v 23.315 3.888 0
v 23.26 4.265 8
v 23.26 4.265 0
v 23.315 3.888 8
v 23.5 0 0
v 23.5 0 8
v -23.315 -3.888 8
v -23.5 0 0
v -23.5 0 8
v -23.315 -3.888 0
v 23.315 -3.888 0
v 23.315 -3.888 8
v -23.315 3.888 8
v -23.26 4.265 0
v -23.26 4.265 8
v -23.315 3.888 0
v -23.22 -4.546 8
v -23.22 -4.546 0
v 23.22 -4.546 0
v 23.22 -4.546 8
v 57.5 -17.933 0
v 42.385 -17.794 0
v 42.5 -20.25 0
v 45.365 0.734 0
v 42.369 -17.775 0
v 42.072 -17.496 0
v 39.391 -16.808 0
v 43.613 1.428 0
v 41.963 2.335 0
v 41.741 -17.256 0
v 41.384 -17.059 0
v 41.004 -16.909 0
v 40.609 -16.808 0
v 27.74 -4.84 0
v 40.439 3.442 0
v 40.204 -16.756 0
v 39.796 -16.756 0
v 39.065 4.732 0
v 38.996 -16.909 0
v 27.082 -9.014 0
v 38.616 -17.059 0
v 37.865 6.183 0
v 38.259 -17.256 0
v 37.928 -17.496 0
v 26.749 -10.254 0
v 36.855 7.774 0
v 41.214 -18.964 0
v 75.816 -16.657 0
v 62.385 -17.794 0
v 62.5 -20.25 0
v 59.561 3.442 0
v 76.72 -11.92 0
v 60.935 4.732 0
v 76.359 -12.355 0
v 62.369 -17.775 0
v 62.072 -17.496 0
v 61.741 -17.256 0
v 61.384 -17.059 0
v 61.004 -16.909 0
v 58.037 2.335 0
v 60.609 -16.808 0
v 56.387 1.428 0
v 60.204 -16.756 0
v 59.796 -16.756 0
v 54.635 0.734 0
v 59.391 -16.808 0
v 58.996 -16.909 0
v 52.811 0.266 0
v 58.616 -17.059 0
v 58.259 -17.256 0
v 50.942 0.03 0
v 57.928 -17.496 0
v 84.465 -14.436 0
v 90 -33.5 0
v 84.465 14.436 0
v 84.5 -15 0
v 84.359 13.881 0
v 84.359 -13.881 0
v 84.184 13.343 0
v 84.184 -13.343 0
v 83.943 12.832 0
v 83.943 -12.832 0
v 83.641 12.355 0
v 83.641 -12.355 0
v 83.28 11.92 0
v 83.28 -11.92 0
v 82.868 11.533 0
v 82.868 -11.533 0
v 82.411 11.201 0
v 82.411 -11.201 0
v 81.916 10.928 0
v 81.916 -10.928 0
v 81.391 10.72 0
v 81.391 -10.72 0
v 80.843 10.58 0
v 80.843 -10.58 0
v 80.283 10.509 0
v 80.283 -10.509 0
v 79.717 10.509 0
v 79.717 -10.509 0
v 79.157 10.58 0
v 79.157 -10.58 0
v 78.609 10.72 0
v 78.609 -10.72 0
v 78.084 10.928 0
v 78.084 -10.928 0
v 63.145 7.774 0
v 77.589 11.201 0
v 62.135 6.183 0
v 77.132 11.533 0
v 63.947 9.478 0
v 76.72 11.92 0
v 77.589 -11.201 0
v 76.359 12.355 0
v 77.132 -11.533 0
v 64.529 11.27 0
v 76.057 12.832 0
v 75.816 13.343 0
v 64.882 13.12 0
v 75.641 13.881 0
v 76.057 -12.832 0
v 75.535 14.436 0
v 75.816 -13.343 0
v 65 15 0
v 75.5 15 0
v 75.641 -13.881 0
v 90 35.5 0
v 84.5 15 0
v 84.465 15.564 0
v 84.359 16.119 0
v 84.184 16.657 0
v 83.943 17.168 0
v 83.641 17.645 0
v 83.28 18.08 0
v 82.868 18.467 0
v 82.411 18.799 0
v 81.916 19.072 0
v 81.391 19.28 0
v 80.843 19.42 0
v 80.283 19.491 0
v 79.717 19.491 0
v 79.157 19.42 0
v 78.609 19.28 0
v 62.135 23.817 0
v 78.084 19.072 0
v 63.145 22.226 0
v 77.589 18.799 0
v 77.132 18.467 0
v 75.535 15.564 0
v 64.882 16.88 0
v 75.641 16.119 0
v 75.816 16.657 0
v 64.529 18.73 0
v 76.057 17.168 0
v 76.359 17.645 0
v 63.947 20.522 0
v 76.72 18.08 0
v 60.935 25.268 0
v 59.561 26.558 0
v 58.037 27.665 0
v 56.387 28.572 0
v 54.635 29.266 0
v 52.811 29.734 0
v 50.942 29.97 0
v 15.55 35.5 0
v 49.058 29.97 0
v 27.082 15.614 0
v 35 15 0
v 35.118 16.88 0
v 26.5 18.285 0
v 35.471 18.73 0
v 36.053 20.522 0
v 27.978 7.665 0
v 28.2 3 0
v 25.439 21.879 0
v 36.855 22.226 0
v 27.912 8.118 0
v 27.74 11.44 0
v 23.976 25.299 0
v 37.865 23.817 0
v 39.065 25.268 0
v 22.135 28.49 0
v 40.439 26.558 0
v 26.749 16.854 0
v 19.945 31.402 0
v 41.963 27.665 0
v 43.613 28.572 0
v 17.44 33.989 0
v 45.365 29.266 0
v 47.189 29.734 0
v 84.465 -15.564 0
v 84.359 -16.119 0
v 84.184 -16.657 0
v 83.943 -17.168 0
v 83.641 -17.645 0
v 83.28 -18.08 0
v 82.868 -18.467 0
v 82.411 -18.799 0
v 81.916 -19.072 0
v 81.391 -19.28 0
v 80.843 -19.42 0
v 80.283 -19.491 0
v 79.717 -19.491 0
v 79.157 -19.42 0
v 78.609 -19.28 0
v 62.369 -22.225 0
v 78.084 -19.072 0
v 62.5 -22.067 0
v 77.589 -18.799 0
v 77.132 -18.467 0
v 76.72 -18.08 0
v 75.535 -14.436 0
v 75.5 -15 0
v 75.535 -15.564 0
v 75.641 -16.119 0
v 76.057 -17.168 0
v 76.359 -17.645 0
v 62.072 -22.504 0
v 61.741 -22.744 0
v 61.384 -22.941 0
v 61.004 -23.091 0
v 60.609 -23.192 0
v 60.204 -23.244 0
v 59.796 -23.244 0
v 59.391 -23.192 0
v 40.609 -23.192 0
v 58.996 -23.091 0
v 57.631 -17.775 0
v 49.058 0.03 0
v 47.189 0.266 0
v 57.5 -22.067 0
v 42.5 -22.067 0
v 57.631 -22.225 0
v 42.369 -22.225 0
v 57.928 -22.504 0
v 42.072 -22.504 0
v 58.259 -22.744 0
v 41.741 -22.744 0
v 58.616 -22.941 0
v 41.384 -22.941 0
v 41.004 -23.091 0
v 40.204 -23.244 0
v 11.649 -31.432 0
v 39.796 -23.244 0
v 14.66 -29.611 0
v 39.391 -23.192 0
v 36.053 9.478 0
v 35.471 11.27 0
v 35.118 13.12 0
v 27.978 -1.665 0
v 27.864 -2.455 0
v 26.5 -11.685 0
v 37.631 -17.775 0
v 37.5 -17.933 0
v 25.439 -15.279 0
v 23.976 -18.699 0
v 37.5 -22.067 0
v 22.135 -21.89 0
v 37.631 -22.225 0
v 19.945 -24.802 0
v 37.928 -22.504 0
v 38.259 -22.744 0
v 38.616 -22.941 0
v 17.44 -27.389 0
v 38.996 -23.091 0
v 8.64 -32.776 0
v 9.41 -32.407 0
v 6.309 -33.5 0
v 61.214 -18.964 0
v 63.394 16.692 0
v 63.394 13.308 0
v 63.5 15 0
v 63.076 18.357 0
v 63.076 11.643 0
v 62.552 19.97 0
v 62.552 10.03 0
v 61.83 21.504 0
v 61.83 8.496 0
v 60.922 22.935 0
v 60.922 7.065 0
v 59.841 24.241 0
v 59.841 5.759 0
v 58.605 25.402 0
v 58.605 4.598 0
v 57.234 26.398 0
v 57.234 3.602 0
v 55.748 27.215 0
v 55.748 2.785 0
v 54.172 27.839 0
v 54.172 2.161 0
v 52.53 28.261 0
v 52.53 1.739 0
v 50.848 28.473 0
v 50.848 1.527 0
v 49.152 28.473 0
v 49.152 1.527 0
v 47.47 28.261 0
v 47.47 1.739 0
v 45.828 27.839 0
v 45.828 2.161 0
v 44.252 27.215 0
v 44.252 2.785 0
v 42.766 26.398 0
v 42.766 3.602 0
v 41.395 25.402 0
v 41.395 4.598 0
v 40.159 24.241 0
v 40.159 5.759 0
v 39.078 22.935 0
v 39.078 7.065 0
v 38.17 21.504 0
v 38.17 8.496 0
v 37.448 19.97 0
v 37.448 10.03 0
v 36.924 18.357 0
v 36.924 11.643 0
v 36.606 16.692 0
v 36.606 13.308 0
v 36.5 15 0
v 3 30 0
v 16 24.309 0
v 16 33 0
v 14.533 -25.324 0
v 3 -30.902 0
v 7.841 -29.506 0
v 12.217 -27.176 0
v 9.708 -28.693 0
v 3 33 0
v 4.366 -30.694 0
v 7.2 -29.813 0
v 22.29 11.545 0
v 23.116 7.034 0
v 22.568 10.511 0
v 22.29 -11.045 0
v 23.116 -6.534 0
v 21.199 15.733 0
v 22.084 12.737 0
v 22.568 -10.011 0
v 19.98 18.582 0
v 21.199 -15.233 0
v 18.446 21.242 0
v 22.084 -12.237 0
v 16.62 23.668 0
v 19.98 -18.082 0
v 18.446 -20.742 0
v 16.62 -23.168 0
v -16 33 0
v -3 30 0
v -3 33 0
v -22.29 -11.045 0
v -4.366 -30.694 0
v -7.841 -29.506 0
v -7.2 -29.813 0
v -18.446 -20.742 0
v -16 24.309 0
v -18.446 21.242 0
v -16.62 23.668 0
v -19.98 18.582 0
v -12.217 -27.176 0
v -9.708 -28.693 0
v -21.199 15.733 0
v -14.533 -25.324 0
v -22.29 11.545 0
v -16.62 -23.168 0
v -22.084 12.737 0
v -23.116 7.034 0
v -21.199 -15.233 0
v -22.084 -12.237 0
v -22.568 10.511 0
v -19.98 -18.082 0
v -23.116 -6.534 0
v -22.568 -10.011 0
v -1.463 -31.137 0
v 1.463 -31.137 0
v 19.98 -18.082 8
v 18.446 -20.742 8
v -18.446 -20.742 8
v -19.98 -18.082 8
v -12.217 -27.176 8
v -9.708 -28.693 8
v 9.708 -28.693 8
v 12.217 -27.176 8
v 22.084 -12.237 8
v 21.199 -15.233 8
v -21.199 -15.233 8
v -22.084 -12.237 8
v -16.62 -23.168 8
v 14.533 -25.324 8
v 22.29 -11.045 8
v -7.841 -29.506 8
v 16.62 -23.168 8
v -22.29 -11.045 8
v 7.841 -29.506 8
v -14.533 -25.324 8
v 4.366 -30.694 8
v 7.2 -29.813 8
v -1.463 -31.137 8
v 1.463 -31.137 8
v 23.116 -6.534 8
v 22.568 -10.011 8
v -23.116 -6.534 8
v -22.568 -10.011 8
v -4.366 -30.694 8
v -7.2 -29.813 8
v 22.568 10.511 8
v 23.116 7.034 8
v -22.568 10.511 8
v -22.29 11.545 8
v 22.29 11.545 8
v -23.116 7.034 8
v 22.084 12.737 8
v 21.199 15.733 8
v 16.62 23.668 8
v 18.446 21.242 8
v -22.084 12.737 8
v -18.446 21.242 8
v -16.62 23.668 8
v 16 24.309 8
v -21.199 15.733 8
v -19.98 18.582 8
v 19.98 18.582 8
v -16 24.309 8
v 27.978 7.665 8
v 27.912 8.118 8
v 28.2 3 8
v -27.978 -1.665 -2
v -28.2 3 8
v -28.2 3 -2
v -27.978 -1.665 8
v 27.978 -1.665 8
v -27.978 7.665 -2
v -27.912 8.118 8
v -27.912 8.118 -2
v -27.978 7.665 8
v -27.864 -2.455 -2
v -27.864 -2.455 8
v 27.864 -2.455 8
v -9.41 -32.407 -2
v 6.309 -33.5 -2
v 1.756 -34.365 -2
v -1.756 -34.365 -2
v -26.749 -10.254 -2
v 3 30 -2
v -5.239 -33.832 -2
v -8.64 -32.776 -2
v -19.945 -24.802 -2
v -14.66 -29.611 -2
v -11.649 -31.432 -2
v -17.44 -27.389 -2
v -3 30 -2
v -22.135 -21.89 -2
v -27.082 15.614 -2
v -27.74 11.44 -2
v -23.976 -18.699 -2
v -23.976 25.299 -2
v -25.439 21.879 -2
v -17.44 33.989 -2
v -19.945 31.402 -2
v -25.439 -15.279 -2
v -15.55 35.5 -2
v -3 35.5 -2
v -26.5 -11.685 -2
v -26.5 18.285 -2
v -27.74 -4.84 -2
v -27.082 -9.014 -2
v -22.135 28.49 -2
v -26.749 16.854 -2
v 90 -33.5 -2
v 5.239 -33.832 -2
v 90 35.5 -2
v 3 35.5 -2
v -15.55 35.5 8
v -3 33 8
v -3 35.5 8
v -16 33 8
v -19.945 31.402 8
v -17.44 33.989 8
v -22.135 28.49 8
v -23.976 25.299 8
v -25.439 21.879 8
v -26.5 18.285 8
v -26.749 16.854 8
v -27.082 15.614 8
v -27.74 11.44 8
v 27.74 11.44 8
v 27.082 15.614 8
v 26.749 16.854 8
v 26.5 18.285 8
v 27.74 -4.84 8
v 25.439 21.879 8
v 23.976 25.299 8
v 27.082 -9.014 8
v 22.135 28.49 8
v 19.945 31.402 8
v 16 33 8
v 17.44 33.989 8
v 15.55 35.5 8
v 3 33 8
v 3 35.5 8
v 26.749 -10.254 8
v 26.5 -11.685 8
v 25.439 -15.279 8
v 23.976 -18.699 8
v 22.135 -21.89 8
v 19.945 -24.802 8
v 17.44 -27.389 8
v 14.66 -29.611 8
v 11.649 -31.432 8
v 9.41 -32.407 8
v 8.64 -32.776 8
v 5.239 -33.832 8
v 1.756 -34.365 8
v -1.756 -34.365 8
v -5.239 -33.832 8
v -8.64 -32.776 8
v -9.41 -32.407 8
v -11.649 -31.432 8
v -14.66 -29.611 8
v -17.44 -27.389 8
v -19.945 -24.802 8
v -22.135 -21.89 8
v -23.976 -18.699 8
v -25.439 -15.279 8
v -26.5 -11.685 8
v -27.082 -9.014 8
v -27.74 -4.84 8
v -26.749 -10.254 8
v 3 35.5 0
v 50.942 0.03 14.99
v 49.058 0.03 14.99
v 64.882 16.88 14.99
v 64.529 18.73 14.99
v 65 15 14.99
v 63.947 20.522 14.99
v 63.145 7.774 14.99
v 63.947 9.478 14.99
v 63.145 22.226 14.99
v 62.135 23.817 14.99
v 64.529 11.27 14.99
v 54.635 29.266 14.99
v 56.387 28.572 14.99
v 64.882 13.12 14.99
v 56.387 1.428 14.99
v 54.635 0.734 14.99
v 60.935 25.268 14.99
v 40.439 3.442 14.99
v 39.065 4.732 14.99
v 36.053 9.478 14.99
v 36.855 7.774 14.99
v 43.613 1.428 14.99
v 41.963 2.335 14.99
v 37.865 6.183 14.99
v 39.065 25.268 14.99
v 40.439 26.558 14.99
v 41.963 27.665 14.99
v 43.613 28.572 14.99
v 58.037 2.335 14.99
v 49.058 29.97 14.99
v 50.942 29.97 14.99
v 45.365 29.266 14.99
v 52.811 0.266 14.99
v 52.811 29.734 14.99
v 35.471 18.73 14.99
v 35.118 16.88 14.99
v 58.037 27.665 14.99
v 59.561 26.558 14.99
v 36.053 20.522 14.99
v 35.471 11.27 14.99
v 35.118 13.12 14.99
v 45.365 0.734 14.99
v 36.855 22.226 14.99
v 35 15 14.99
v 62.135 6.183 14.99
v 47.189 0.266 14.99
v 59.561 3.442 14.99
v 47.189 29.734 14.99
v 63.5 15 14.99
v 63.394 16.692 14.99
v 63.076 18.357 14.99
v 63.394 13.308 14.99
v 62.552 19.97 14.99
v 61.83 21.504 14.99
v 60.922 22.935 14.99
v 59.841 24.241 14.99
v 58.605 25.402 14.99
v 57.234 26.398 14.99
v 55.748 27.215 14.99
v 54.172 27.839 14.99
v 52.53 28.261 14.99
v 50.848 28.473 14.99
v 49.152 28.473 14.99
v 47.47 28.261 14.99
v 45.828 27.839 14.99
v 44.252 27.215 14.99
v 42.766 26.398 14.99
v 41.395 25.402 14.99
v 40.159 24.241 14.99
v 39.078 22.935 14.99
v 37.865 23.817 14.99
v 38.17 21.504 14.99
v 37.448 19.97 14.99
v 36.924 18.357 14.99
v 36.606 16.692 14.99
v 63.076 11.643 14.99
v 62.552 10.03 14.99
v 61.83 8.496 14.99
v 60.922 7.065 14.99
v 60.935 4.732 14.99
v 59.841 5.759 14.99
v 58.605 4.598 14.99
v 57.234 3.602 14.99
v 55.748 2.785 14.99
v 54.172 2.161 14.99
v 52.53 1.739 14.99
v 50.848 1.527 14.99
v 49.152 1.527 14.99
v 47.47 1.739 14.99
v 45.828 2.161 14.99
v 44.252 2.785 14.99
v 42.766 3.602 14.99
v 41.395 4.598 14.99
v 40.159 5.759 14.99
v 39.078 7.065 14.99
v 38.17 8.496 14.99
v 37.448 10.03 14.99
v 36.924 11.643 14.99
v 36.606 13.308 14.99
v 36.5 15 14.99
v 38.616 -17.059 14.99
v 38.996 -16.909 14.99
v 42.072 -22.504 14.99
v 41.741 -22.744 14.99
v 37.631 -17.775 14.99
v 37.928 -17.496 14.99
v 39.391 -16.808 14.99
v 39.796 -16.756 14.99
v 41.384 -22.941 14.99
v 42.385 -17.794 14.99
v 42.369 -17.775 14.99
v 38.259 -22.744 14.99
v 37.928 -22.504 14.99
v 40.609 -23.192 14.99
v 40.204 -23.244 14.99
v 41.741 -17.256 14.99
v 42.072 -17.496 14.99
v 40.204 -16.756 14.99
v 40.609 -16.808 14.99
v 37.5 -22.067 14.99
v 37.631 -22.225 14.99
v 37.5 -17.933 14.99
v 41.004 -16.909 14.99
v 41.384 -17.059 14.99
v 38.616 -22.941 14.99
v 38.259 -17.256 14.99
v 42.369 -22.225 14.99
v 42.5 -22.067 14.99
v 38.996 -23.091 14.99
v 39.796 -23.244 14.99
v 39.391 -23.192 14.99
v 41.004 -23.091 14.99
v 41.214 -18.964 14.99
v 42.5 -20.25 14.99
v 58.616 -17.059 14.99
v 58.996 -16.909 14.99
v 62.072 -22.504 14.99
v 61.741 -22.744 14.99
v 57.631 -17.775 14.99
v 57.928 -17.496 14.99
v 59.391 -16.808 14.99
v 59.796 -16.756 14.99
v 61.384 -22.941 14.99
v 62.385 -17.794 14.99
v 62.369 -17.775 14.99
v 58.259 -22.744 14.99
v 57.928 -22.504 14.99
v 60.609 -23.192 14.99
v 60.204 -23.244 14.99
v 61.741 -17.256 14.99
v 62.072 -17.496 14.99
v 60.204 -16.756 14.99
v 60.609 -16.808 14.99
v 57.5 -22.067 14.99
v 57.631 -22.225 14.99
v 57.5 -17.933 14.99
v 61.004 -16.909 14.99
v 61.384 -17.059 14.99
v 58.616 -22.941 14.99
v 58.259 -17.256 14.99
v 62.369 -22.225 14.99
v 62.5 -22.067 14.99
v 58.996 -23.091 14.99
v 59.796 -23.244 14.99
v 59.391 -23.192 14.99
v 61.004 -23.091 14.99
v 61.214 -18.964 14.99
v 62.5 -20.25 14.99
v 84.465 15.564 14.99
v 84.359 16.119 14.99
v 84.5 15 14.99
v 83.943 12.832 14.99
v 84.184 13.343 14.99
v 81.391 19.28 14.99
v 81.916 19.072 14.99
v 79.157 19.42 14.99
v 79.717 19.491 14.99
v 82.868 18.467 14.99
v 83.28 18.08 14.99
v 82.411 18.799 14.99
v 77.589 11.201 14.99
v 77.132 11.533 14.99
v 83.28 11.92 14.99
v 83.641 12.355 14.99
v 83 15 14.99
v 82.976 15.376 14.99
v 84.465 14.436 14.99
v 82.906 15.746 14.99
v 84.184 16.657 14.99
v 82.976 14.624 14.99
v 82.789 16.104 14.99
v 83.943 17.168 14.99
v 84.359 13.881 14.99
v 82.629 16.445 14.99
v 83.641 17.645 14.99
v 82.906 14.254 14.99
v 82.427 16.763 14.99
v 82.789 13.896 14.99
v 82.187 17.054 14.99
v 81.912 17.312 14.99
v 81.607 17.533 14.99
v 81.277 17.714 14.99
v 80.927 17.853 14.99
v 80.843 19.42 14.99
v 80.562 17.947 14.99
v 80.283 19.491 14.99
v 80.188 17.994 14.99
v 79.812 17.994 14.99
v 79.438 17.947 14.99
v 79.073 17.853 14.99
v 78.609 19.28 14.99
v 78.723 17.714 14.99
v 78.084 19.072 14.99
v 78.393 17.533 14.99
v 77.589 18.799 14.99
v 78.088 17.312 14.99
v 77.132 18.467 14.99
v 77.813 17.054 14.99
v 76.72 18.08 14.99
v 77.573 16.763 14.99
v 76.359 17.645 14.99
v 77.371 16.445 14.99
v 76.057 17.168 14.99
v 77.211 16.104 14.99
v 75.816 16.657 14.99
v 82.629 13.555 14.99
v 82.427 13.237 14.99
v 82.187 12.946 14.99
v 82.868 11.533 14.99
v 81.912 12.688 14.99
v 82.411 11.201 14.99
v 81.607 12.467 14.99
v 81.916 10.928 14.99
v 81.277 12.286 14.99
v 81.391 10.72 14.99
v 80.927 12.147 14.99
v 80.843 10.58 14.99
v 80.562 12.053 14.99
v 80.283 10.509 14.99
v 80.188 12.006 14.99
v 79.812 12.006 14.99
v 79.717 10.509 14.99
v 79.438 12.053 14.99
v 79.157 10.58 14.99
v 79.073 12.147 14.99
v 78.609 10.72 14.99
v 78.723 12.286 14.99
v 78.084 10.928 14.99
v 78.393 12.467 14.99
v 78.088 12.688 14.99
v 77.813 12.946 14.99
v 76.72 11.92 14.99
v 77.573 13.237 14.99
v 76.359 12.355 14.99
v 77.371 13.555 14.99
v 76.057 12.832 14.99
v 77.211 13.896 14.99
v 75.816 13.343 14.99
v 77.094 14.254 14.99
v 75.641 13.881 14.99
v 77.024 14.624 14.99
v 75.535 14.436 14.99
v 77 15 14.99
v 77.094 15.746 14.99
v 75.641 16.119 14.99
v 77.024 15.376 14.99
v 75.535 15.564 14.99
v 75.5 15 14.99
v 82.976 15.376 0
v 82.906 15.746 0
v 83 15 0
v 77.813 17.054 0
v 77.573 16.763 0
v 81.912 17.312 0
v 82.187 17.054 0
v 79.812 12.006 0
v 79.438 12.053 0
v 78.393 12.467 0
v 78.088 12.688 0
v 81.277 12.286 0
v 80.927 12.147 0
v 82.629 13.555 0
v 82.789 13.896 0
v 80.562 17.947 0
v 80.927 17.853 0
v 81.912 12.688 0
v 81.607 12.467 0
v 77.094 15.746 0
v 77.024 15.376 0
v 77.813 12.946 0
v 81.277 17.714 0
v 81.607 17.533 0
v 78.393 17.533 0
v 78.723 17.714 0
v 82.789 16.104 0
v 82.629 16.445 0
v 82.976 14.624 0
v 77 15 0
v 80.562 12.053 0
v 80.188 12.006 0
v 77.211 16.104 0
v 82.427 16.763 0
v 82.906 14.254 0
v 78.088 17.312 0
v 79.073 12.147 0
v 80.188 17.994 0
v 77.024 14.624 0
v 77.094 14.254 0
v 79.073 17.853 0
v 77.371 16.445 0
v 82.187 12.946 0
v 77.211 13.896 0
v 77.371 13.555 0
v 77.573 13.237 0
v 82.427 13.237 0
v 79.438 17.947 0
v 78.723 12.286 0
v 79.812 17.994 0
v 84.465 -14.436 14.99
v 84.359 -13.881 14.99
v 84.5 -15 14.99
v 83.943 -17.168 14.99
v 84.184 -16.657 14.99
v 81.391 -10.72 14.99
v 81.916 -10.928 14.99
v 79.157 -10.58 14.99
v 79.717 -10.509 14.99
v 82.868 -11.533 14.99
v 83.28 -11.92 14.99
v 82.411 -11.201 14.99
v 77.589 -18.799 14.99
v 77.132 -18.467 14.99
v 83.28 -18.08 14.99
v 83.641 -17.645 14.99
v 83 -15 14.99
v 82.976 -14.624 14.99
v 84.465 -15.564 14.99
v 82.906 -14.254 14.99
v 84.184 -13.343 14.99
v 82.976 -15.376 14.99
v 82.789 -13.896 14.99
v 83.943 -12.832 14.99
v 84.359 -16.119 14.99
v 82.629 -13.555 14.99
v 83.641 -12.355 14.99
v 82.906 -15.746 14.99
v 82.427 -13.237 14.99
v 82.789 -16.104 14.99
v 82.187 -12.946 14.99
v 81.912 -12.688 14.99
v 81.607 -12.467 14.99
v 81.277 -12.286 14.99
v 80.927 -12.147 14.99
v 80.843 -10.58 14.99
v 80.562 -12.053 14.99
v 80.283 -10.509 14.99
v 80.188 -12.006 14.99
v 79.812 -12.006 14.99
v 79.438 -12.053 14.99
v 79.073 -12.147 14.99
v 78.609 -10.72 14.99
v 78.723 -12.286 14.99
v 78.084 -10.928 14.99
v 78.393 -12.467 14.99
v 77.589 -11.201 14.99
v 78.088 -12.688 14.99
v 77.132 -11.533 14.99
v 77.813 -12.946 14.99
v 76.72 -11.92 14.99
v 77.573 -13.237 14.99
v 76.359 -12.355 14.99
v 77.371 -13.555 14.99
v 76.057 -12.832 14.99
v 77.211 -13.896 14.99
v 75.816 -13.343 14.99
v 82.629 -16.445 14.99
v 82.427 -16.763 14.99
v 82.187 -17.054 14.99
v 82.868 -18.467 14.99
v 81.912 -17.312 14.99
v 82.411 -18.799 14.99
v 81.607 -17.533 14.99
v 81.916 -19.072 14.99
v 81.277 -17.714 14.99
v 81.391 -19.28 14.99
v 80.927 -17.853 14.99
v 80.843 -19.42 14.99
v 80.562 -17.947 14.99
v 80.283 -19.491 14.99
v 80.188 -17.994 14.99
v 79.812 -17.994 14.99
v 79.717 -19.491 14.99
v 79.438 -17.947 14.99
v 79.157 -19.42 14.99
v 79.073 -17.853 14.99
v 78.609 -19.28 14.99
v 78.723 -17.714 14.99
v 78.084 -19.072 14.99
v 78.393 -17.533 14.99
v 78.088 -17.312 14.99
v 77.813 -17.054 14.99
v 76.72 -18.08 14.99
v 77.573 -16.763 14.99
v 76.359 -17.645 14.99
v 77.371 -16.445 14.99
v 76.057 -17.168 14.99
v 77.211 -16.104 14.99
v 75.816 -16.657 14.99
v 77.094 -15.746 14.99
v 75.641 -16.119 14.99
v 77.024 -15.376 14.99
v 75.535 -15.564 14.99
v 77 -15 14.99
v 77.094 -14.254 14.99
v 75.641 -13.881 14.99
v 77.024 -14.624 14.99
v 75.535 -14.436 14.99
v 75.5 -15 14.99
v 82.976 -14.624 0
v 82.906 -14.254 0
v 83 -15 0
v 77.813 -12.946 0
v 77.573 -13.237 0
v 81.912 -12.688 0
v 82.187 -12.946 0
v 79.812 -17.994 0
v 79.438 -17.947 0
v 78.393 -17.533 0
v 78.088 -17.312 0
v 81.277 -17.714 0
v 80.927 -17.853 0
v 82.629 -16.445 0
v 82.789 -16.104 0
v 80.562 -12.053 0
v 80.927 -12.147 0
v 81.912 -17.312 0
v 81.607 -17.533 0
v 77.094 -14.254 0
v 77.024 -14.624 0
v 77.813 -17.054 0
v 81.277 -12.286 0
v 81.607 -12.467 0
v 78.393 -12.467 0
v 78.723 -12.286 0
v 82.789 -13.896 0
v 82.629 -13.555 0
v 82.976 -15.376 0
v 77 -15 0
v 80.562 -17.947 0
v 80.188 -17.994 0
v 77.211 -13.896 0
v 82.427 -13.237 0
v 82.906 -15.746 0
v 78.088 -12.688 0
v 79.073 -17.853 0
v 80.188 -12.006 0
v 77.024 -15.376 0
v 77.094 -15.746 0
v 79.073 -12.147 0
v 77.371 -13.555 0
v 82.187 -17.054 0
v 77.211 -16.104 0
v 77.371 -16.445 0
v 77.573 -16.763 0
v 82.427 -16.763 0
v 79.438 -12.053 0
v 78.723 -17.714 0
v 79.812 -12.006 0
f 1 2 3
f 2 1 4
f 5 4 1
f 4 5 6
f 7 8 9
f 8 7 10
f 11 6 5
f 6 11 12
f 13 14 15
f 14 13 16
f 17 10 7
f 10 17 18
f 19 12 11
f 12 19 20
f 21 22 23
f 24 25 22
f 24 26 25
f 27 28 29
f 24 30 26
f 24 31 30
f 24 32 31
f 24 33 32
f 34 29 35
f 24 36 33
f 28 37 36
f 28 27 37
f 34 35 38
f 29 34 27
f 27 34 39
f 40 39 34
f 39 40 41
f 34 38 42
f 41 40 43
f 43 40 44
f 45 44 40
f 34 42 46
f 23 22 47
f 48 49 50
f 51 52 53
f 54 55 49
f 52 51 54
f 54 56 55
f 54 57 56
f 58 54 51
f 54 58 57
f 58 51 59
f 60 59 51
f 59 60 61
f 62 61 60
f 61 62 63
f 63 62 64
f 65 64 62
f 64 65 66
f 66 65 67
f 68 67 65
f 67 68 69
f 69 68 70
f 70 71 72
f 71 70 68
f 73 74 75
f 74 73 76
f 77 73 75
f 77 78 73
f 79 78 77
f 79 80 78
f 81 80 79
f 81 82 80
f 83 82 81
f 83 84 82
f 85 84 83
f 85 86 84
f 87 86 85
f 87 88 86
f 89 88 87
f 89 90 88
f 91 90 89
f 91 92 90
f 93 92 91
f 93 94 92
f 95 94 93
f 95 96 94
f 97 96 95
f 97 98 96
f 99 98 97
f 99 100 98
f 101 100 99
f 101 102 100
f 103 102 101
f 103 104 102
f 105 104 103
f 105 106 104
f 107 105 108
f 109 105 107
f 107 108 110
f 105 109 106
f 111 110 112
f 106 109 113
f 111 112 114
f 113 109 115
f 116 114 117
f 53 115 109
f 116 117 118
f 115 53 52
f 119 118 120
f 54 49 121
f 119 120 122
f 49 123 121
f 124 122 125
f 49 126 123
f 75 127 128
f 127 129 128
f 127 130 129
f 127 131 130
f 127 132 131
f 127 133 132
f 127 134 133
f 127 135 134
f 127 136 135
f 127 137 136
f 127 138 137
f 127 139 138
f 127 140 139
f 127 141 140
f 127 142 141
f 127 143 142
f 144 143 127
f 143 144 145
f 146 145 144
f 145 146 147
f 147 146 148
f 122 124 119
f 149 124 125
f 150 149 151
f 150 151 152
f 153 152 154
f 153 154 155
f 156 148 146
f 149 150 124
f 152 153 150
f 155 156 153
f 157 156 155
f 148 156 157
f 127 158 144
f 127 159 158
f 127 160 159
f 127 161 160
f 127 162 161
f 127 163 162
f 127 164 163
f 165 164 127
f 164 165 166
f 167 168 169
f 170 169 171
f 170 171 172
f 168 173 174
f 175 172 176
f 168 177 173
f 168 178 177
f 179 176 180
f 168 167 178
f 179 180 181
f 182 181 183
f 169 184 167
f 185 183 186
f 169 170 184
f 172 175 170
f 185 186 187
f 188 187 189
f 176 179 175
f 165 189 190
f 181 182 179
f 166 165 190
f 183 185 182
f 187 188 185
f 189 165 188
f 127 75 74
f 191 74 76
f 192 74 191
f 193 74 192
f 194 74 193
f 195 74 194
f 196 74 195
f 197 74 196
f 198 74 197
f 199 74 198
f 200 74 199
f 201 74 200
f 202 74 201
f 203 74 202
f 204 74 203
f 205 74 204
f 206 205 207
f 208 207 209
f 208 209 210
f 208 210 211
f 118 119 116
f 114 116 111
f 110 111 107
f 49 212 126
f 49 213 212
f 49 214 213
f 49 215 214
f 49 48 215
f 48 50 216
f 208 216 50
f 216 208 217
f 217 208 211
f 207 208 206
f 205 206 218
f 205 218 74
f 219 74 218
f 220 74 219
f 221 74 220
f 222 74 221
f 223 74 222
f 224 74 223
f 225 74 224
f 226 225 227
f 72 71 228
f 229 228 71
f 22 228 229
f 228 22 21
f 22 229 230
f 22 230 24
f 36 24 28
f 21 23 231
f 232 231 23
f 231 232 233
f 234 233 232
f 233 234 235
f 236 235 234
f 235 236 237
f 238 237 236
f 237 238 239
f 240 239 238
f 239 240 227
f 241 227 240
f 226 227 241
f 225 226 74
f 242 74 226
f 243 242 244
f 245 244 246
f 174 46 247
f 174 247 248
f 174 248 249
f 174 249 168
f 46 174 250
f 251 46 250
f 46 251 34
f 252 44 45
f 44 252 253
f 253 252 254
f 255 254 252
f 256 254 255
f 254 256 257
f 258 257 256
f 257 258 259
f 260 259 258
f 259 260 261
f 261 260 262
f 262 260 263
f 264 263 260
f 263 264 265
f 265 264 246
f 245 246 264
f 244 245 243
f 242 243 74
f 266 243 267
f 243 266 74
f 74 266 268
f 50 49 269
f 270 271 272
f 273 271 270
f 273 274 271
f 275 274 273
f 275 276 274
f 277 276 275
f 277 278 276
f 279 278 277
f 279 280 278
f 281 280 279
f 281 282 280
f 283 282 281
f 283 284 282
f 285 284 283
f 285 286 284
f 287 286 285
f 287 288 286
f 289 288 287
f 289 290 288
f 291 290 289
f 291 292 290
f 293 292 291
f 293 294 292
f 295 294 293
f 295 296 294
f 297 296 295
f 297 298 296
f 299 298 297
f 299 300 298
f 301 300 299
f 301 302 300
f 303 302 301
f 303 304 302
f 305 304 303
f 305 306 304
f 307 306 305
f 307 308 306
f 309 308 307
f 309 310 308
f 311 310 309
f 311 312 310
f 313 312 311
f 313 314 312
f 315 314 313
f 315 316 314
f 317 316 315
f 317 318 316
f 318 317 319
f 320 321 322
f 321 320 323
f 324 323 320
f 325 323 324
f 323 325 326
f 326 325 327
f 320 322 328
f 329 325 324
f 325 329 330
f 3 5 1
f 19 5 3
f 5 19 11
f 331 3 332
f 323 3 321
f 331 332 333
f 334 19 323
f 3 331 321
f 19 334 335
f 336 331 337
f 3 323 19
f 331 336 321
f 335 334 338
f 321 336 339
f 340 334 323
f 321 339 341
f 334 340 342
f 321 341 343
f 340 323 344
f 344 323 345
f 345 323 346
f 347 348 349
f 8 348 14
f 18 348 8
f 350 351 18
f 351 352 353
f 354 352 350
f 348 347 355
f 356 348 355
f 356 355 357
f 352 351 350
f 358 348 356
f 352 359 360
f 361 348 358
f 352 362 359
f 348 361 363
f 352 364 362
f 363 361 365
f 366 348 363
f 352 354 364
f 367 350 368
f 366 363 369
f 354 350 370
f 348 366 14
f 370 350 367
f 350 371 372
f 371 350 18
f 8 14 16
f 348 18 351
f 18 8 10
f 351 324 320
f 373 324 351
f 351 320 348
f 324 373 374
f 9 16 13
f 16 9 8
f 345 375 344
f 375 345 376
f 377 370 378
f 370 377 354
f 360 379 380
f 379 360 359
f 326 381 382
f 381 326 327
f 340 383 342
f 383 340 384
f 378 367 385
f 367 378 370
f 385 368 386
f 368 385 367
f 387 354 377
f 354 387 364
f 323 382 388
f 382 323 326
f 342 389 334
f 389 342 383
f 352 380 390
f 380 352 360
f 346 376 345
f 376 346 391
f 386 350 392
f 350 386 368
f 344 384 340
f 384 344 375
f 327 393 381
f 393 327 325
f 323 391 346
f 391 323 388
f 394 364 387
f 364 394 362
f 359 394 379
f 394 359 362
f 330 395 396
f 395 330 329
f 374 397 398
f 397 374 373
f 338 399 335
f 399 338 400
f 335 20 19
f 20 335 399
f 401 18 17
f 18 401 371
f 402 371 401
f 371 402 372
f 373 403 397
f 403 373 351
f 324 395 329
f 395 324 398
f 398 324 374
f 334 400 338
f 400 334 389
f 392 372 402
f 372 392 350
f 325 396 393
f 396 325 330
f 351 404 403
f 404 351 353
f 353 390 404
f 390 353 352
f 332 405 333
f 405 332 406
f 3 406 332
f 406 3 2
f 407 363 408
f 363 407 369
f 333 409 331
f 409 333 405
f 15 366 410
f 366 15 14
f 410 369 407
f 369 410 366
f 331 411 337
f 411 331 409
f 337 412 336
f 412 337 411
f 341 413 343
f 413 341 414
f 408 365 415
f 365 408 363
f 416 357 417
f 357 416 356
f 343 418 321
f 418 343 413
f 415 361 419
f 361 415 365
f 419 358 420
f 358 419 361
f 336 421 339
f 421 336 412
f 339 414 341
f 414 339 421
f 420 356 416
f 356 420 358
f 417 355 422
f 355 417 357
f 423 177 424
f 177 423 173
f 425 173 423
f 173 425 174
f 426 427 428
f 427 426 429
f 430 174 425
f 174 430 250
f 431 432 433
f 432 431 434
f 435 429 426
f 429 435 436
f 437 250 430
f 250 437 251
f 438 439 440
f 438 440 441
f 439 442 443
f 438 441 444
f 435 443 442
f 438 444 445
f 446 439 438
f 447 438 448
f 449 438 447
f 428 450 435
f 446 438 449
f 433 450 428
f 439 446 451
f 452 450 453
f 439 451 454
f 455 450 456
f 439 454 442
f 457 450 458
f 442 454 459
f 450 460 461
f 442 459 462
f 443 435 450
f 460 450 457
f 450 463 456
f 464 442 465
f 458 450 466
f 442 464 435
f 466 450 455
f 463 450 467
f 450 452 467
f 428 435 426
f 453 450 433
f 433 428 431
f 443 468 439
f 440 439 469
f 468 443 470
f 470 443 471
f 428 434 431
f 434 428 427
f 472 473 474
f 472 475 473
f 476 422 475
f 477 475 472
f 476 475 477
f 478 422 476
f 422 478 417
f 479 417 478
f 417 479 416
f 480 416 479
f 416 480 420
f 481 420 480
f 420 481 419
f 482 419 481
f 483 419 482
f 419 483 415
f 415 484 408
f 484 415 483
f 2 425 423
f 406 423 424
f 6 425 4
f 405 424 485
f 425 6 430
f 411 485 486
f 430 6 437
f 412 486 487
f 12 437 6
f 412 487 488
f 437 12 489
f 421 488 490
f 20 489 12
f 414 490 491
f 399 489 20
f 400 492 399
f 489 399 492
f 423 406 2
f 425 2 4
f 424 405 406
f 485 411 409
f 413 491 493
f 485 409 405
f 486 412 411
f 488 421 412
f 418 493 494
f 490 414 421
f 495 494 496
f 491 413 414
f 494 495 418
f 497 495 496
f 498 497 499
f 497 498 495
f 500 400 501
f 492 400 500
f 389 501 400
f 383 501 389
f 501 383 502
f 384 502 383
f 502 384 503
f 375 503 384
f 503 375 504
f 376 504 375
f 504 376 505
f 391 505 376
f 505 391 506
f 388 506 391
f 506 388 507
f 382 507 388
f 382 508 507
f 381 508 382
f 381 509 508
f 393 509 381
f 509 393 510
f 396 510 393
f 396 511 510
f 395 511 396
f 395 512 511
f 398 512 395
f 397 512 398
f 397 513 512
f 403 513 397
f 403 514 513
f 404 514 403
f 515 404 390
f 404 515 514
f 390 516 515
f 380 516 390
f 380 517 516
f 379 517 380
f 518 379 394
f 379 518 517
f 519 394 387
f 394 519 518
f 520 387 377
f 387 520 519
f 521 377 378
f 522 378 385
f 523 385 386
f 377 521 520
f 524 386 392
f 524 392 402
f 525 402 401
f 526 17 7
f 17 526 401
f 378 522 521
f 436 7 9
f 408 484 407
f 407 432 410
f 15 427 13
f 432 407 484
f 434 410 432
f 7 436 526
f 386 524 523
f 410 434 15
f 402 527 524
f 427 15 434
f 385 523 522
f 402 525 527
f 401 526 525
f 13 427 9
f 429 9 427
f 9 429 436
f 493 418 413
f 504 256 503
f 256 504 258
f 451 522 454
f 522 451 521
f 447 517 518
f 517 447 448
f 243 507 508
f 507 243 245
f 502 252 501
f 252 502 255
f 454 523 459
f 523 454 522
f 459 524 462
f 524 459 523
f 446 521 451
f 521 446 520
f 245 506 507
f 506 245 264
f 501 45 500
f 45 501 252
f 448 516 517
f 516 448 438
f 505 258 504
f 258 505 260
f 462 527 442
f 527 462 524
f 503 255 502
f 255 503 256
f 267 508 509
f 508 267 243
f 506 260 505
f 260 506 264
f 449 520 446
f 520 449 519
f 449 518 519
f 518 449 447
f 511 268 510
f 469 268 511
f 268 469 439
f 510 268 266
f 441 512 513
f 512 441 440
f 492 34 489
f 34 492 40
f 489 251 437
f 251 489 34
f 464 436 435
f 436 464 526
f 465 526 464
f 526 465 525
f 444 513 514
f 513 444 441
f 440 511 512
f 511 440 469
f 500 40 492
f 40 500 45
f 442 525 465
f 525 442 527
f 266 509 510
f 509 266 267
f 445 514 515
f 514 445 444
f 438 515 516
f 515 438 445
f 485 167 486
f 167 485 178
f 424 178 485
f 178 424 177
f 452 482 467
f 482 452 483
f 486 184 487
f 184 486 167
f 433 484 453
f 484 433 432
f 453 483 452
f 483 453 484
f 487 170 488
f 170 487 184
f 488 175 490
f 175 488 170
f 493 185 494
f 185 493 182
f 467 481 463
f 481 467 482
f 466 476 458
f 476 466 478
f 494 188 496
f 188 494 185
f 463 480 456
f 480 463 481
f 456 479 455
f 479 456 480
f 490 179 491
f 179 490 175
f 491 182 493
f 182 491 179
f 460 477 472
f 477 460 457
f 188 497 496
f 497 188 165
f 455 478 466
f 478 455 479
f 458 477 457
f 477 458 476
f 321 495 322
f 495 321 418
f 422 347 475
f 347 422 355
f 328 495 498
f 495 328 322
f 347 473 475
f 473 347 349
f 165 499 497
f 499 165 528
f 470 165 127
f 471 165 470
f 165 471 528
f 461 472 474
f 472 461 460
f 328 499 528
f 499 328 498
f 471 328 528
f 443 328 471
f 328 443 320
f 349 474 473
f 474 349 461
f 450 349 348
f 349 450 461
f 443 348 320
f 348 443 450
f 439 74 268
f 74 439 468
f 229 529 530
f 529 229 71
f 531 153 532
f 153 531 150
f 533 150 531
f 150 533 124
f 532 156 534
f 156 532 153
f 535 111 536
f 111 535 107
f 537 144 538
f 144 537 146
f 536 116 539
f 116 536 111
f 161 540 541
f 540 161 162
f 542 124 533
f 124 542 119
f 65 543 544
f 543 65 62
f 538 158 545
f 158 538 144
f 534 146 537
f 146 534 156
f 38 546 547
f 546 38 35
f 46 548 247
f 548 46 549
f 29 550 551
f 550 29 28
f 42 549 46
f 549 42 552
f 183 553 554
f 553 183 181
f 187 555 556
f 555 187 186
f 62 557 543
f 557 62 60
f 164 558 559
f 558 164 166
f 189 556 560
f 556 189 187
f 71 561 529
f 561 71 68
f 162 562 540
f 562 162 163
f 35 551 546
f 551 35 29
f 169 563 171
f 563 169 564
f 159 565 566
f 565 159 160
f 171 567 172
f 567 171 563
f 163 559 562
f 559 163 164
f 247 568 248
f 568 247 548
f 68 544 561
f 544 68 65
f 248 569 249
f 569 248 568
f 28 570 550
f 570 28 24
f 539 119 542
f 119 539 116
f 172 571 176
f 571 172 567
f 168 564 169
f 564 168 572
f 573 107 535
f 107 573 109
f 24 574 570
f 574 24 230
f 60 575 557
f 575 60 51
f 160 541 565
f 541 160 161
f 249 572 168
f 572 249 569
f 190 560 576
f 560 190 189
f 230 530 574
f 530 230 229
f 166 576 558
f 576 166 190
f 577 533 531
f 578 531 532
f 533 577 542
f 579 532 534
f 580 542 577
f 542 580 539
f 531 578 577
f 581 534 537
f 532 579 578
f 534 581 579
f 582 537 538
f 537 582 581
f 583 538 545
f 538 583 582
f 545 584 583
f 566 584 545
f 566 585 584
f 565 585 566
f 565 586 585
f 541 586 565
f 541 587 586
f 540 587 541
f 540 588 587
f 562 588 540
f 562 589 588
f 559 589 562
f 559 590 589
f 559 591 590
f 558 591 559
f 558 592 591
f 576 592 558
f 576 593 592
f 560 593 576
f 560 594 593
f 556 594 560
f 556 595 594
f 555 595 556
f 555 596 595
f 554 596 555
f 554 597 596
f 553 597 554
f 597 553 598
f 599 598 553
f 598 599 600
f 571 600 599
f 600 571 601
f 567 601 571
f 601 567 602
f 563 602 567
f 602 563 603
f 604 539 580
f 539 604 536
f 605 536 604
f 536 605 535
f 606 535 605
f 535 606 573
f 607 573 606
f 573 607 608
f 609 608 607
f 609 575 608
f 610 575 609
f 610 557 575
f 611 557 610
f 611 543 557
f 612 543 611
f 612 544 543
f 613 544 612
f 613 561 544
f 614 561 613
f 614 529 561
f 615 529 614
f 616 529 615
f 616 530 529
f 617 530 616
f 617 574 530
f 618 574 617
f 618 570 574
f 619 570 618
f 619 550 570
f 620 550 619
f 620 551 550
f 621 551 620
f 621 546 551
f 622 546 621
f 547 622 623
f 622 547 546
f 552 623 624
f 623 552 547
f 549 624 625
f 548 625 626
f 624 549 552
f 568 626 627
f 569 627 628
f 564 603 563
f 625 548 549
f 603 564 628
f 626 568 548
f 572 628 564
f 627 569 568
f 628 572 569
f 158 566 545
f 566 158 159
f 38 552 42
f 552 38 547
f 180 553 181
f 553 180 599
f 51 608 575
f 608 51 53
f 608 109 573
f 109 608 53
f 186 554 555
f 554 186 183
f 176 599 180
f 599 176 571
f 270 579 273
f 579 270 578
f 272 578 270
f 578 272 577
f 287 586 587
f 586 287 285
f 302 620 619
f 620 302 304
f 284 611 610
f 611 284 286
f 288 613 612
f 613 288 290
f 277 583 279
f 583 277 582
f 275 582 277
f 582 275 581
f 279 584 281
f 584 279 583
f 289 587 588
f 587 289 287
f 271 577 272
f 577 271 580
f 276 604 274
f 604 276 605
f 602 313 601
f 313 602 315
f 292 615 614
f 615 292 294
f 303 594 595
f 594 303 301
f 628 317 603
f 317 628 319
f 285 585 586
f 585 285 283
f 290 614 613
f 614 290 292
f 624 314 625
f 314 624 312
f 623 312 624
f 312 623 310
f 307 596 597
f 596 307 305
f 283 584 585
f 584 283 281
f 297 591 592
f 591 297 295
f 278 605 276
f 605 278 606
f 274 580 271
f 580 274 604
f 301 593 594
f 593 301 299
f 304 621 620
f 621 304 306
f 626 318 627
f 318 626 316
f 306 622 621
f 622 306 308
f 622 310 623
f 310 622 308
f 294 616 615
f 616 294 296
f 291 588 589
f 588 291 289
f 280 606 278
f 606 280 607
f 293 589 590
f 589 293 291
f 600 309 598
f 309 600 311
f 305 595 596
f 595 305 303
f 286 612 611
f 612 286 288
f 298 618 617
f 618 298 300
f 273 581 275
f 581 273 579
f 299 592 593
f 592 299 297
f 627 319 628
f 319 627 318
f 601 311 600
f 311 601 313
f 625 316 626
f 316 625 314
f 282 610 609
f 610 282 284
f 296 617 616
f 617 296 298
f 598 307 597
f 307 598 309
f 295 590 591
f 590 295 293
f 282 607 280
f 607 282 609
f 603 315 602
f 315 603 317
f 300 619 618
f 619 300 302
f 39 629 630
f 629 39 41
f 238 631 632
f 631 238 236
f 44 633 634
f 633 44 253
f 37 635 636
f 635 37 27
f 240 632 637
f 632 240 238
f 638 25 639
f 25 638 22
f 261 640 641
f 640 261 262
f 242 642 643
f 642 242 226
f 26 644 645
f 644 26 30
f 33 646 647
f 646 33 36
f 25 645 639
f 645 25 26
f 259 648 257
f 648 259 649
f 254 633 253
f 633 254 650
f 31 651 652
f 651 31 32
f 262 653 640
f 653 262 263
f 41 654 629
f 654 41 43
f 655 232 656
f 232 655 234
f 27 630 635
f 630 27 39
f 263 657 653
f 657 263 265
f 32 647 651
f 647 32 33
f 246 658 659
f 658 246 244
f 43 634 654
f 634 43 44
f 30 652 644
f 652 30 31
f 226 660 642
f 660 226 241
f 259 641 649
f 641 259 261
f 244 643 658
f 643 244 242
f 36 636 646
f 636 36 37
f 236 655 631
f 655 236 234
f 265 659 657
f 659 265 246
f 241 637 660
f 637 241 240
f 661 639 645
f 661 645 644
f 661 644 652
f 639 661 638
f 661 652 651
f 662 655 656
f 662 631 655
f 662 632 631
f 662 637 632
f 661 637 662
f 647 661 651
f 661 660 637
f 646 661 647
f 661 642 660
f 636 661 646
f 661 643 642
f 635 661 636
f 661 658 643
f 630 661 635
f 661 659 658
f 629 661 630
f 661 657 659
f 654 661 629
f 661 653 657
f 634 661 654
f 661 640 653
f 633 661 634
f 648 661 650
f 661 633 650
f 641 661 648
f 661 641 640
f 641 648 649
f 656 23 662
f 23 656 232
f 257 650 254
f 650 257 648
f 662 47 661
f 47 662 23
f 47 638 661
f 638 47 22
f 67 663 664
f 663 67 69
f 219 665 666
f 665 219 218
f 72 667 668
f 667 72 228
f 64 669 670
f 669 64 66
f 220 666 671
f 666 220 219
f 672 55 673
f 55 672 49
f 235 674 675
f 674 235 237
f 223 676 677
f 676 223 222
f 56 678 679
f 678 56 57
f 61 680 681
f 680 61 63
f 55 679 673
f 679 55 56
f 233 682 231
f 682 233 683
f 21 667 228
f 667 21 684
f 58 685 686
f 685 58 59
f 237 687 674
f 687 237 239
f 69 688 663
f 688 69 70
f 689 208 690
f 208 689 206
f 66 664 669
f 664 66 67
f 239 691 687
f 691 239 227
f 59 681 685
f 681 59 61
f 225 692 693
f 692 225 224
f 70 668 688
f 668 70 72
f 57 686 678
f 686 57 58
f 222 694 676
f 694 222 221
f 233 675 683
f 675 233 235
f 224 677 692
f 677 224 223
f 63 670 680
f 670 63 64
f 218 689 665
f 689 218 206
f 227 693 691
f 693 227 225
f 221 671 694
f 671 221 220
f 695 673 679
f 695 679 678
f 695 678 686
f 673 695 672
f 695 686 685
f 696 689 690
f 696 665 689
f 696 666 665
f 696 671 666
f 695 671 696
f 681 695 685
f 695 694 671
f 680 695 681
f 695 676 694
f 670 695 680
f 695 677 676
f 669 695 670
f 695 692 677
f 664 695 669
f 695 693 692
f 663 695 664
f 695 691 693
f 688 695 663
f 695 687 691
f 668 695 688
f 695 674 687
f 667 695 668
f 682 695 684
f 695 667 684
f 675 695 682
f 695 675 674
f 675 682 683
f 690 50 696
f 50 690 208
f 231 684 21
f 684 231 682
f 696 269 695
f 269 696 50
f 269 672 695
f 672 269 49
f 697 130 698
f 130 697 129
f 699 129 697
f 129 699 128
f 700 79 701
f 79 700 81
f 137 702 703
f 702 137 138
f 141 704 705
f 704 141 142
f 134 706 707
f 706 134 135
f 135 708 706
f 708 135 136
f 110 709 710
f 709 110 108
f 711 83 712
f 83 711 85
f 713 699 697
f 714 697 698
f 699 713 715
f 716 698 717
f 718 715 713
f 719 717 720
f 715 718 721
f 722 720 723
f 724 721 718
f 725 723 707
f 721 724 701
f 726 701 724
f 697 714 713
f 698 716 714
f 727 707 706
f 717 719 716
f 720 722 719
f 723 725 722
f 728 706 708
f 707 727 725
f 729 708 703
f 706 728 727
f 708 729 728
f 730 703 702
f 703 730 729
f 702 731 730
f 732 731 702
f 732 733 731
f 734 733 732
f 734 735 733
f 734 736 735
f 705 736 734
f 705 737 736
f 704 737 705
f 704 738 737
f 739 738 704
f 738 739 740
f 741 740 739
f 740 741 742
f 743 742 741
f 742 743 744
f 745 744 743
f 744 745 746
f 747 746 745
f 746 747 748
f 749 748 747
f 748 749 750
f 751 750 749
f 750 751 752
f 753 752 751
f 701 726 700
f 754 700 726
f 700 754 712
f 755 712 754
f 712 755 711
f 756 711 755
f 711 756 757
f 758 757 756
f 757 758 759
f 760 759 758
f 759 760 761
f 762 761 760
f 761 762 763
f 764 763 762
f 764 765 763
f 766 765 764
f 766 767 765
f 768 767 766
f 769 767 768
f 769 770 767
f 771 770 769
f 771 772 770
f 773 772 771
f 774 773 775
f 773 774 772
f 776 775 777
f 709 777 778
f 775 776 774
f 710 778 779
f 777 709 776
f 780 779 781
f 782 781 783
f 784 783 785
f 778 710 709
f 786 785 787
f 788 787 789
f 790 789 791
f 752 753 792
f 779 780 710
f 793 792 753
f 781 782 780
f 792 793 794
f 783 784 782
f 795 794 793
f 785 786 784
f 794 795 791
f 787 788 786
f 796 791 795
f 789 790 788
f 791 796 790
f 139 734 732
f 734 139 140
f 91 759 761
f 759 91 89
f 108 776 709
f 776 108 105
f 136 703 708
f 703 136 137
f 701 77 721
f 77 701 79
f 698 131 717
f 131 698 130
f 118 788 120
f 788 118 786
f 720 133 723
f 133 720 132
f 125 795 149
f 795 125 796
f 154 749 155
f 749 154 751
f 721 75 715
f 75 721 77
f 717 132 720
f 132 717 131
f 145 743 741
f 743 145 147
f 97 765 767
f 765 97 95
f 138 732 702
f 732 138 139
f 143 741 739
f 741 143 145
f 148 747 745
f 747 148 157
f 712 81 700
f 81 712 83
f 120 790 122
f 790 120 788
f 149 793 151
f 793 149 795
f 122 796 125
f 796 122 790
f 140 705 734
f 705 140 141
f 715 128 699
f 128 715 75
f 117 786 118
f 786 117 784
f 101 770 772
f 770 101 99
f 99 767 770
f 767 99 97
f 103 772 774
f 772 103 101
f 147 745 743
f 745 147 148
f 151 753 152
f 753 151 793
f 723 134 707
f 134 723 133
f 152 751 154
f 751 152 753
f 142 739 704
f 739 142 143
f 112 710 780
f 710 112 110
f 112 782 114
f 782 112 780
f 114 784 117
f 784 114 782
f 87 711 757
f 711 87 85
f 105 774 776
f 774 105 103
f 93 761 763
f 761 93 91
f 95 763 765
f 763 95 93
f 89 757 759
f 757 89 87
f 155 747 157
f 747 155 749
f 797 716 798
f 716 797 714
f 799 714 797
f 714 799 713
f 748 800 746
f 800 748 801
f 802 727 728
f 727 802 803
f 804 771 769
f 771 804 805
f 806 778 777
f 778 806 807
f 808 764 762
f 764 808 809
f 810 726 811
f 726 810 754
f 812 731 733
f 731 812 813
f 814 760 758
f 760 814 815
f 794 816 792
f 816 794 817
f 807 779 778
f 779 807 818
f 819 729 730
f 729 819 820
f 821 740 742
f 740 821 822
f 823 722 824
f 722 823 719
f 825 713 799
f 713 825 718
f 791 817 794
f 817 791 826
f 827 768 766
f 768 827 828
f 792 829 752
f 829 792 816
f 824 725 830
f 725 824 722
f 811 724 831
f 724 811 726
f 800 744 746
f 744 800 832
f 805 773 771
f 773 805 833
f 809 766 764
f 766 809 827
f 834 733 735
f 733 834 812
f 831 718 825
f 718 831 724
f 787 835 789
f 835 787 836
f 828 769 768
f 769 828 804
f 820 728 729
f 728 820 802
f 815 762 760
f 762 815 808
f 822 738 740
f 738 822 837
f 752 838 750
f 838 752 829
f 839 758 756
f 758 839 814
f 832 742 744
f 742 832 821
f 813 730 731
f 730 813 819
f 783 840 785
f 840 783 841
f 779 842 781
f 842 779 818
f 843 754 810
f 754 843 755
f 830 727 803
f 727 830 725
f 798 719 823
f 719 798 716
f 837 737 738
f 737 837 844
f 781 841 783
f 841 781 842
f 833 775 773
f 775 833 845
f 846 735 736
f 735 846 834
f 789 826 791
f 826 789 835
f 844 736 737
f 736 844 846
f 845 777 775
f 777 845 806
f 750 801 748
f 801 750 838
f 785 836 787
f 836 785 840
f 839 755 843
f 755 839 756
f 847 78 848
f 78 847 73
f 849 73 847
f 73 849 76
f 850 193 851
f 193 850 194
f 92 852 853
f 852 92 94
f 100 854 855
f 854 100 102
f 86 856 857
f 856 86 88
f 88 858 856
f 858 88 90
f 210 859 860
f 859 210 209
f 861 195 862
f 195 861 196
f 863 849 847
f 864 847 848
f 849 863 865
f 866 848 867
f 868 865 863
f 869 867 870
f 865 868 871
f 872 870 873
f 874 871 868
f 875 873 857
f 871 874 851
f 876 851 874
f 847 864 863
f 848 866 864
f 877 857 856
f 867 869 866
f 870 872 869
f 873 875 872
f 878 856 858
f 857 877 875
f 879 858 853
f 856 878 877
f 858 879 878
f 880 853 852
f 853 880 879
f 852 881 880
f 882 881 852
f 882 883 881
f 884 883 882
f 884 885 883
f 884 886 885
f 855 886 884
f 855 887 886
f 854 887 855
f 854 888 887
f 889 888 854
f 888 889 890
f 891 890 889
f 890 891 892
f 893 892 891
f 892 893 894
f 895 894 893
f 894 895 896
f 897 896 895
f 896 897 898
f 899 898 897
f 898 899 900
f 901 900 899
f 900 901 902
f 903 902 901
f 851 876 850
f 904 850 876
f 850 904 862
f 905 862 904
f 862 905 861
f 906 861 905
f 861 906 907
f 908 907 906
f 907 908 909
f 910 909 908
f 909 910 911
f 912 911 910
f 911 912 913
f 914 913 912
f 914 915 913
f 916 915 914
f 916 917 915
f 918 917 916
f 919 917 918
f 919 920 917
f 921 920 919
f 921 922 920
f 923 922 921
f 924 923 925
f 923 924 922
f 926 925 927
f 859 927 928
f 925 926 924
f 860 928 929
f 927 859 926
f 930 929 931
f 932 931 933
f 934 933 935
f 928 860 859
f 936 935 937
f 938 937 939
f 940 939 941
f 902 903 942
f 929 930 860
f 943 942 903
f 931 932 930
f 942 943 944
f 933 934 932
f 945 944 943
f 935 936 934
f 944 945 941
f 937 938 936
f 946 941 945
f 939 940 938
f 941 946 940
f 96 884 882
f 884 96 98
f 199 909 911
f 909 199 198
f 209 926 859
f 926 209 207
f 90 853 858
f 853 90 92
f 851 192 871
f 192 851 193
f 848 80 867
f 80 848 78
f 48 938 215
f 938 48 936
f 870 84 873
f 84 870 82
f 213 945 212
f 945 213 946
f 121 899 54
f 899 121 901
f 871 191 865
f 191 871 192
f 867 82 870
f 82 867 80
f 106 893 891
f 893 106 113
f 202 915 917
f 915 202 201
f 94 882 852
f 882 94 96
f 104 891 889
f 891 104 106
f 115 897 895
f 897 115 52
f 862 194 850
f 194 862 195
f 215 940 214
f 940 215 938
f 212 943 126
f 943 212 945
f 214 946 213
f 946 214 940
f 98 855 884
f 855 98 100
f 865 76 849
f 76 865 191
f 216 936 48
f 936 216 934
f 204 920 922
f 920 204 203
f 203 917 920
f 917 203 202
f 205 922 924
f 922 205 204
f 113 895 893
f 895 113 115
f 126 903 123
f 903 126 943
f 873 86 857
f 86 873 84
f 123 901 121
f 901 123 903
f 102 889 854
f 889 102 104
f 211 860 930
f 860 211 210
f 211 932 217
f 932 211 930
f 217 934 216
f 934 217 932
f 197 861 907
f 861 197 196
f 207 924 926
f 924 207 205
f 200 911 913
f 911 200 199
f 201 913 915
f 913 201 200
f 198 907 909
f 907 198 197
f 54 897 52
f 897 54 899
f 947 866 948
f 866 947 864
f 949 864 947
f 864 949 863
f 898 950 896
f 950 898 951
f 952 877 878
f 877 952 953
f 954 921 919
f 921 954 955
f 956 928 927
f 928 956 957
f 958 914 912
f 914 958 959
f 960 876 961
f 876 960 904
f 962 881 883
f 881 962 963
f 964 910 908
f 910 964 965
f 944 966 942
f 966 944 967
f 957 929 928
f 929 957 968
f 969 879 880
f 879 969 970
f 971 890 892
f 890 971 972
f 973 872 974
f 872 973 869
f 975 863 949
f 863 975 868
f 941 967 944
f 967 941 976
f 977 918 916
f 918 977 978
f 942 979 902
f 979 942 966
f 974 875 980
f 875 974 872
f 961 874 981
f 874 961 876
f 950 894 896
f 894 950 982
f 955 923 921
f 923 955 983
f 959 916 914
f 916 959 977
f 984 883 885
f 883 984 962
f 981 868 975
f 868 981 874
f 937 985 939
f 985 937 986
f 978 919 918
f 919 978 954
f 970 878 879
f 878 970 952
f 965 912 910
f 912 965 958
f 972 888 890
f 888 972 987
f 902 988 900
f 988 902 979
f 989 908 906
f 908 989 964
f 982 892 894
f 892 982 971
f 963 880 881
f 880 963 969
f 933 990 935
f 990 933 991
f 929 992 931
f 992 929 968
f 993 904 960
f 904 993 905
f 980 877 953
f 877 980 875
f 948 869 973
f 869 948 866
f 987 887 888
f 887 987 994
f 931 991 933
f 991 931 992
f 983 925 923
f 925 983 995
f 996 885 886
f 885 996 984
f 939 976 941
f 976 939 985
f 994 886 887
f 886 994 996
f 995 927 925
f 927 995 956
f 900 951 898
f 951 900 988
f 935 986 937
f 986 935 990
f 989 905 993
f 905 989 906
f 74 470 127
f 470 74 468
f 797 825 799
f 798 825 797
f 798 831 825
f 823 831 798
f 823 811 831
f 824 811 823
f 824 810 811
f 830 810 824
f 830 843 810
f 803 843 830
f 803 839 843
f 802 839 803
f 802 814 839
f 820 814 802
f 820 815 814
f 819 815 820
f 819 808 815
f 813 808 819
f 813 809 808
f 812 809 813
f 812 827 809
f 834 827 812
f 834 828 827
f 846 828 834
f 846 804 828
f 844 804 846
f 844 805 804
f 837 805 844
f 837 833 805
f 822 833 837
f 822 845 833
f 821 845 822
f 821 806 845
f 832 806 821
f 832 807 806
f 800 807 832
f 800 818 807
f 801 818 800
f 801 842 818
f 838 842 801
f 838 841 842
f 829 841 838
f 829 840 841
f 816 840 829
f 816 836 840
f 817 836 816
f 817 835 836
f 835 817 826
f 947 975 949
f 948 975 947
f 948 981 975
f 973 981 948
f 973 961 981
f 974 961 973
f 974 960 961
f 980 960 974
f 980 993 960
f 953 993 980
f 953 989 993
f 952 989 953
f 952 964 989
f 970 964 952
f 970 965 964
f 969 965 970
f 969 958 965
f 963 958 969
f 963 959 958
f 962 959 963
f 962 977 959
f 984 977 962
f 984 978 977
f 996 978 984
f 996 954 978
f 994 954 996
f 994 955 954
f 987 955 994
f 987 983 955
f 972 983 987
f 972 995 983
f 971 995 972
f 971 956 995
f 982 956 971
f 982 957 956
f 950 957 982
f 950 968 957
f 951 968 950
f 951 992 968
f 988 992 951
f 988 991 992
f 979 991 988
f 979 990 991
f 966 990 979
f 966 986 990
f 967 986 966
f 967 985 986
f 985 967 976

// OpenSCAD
// Number of Chargers
chargers = 1; // [0:10]

// Number or Toothpaste Holders
toothpastes = 1; // [0:10]

// Inner Diameter of Toothpaste Holders
toothpaste_d = 27; // [24:36]

// Number of Brush Head Holders
brushes = 2; // [0:10]

// Number of Interdental Brush Holders
interdentals = 2; // [0:10]

module ovoid() {
	scale([1,1.32,1])
cylinder(h=10, r=23.5, center=false);
	translate([0,-6,0]) scale([1,1.1,1]) cylinder(h=10, r=22.8, center=false);
	translate([0,-3,0]) scale([1,1.21,1]) cylinder(h=10, r=23.3, center=false);
	translate([0,3.5,0]) scale([1,1.21,1]) cylinder(h=10, r=23.3, center=false);
	translate([0,6.5,0]) scale([1,1.1,1]) cylinder(h=10, r=22.8, center=false);
}

module charger_holder() {
   translate([3,-33.5,-2]) cube([56,69,2]);
	difference() {
		translate([0,3,-2]) scale([1.2, 1.2, 1]) ovoid();
		ovoid();
	   translate([-16,23,0]) cube([32,10,23]);
	   translate([-25,35.5,-2.5]) cube([50,10,15]);
	   translate([-3,30,-2.5]) cube([6,10,25]);
	}
}

module toothpaste_holder() {
	difference() {
		translate([0,0,-0.01]) cylinder(r=(toothpaste_d+3)/2, h=15);
		translate([0,0,-0.5]) cylinder(r=toothpaste_d/2, h=16);
	}
}

module brush_holder() {
	difference() {
		translate([0,0,-0.01]) cylinder(r=3.25,h=15);
 		translate([2.5,-5,-0.5]) cube([10,10,16]);
 		translate([-12.5,-5,-0.5]) cube([10,10,16]);
 		translate([4.75,-2.5,-0.5]) rotate([0,0,45]) cube([5,5,16]);
	}
}

module interdental_holder() {
	difference() {
		translate([0,0,-0.01]) cylinder(r=4.5, h=15);
		translate([0,0,-0.5]) cylinder(r=3, h=16);
	}
}

module plate(length) {
	translate([30,-33.5,-2]) cube([length,69,2]);
}

$fn=50;

if (chargers > 0)
	for (i = [0:chargers-1])
		translate([62*i,0,0]) charger_holder();

center_width = max(5+toothpastes*(toothpaste_d+8), brushes*20);
interdental_width = ceil(interdentals/2) * 20;

translate([(chargers-1)*62,0,0]) {
	plate(center_width+interdental_width);

	if (toothpastes > 0)
		for (i = [0:toothpastes-1])
			translate([50+(toothpaste_d+8)*i,15,0]) toothpaste_holder();

	if (brushes > 0)
		for (i = [0:brushes-1])
			translate([40+20*i,-20,0]) brush_holder();

	if (interdentals > 0) {
		translate([center_width+40,0,0]) {
			for (i = [0:ceil(interdentals/2)-1]) {
				translate([i*20,15,0]) interdental_holder();
				if ((i < ceil(interdentals/2)-1) || 
					 (interdentals % 2 == 0))
					translate([i*20,-15,0]) interdental_holder();
			}
		}
	}
}
